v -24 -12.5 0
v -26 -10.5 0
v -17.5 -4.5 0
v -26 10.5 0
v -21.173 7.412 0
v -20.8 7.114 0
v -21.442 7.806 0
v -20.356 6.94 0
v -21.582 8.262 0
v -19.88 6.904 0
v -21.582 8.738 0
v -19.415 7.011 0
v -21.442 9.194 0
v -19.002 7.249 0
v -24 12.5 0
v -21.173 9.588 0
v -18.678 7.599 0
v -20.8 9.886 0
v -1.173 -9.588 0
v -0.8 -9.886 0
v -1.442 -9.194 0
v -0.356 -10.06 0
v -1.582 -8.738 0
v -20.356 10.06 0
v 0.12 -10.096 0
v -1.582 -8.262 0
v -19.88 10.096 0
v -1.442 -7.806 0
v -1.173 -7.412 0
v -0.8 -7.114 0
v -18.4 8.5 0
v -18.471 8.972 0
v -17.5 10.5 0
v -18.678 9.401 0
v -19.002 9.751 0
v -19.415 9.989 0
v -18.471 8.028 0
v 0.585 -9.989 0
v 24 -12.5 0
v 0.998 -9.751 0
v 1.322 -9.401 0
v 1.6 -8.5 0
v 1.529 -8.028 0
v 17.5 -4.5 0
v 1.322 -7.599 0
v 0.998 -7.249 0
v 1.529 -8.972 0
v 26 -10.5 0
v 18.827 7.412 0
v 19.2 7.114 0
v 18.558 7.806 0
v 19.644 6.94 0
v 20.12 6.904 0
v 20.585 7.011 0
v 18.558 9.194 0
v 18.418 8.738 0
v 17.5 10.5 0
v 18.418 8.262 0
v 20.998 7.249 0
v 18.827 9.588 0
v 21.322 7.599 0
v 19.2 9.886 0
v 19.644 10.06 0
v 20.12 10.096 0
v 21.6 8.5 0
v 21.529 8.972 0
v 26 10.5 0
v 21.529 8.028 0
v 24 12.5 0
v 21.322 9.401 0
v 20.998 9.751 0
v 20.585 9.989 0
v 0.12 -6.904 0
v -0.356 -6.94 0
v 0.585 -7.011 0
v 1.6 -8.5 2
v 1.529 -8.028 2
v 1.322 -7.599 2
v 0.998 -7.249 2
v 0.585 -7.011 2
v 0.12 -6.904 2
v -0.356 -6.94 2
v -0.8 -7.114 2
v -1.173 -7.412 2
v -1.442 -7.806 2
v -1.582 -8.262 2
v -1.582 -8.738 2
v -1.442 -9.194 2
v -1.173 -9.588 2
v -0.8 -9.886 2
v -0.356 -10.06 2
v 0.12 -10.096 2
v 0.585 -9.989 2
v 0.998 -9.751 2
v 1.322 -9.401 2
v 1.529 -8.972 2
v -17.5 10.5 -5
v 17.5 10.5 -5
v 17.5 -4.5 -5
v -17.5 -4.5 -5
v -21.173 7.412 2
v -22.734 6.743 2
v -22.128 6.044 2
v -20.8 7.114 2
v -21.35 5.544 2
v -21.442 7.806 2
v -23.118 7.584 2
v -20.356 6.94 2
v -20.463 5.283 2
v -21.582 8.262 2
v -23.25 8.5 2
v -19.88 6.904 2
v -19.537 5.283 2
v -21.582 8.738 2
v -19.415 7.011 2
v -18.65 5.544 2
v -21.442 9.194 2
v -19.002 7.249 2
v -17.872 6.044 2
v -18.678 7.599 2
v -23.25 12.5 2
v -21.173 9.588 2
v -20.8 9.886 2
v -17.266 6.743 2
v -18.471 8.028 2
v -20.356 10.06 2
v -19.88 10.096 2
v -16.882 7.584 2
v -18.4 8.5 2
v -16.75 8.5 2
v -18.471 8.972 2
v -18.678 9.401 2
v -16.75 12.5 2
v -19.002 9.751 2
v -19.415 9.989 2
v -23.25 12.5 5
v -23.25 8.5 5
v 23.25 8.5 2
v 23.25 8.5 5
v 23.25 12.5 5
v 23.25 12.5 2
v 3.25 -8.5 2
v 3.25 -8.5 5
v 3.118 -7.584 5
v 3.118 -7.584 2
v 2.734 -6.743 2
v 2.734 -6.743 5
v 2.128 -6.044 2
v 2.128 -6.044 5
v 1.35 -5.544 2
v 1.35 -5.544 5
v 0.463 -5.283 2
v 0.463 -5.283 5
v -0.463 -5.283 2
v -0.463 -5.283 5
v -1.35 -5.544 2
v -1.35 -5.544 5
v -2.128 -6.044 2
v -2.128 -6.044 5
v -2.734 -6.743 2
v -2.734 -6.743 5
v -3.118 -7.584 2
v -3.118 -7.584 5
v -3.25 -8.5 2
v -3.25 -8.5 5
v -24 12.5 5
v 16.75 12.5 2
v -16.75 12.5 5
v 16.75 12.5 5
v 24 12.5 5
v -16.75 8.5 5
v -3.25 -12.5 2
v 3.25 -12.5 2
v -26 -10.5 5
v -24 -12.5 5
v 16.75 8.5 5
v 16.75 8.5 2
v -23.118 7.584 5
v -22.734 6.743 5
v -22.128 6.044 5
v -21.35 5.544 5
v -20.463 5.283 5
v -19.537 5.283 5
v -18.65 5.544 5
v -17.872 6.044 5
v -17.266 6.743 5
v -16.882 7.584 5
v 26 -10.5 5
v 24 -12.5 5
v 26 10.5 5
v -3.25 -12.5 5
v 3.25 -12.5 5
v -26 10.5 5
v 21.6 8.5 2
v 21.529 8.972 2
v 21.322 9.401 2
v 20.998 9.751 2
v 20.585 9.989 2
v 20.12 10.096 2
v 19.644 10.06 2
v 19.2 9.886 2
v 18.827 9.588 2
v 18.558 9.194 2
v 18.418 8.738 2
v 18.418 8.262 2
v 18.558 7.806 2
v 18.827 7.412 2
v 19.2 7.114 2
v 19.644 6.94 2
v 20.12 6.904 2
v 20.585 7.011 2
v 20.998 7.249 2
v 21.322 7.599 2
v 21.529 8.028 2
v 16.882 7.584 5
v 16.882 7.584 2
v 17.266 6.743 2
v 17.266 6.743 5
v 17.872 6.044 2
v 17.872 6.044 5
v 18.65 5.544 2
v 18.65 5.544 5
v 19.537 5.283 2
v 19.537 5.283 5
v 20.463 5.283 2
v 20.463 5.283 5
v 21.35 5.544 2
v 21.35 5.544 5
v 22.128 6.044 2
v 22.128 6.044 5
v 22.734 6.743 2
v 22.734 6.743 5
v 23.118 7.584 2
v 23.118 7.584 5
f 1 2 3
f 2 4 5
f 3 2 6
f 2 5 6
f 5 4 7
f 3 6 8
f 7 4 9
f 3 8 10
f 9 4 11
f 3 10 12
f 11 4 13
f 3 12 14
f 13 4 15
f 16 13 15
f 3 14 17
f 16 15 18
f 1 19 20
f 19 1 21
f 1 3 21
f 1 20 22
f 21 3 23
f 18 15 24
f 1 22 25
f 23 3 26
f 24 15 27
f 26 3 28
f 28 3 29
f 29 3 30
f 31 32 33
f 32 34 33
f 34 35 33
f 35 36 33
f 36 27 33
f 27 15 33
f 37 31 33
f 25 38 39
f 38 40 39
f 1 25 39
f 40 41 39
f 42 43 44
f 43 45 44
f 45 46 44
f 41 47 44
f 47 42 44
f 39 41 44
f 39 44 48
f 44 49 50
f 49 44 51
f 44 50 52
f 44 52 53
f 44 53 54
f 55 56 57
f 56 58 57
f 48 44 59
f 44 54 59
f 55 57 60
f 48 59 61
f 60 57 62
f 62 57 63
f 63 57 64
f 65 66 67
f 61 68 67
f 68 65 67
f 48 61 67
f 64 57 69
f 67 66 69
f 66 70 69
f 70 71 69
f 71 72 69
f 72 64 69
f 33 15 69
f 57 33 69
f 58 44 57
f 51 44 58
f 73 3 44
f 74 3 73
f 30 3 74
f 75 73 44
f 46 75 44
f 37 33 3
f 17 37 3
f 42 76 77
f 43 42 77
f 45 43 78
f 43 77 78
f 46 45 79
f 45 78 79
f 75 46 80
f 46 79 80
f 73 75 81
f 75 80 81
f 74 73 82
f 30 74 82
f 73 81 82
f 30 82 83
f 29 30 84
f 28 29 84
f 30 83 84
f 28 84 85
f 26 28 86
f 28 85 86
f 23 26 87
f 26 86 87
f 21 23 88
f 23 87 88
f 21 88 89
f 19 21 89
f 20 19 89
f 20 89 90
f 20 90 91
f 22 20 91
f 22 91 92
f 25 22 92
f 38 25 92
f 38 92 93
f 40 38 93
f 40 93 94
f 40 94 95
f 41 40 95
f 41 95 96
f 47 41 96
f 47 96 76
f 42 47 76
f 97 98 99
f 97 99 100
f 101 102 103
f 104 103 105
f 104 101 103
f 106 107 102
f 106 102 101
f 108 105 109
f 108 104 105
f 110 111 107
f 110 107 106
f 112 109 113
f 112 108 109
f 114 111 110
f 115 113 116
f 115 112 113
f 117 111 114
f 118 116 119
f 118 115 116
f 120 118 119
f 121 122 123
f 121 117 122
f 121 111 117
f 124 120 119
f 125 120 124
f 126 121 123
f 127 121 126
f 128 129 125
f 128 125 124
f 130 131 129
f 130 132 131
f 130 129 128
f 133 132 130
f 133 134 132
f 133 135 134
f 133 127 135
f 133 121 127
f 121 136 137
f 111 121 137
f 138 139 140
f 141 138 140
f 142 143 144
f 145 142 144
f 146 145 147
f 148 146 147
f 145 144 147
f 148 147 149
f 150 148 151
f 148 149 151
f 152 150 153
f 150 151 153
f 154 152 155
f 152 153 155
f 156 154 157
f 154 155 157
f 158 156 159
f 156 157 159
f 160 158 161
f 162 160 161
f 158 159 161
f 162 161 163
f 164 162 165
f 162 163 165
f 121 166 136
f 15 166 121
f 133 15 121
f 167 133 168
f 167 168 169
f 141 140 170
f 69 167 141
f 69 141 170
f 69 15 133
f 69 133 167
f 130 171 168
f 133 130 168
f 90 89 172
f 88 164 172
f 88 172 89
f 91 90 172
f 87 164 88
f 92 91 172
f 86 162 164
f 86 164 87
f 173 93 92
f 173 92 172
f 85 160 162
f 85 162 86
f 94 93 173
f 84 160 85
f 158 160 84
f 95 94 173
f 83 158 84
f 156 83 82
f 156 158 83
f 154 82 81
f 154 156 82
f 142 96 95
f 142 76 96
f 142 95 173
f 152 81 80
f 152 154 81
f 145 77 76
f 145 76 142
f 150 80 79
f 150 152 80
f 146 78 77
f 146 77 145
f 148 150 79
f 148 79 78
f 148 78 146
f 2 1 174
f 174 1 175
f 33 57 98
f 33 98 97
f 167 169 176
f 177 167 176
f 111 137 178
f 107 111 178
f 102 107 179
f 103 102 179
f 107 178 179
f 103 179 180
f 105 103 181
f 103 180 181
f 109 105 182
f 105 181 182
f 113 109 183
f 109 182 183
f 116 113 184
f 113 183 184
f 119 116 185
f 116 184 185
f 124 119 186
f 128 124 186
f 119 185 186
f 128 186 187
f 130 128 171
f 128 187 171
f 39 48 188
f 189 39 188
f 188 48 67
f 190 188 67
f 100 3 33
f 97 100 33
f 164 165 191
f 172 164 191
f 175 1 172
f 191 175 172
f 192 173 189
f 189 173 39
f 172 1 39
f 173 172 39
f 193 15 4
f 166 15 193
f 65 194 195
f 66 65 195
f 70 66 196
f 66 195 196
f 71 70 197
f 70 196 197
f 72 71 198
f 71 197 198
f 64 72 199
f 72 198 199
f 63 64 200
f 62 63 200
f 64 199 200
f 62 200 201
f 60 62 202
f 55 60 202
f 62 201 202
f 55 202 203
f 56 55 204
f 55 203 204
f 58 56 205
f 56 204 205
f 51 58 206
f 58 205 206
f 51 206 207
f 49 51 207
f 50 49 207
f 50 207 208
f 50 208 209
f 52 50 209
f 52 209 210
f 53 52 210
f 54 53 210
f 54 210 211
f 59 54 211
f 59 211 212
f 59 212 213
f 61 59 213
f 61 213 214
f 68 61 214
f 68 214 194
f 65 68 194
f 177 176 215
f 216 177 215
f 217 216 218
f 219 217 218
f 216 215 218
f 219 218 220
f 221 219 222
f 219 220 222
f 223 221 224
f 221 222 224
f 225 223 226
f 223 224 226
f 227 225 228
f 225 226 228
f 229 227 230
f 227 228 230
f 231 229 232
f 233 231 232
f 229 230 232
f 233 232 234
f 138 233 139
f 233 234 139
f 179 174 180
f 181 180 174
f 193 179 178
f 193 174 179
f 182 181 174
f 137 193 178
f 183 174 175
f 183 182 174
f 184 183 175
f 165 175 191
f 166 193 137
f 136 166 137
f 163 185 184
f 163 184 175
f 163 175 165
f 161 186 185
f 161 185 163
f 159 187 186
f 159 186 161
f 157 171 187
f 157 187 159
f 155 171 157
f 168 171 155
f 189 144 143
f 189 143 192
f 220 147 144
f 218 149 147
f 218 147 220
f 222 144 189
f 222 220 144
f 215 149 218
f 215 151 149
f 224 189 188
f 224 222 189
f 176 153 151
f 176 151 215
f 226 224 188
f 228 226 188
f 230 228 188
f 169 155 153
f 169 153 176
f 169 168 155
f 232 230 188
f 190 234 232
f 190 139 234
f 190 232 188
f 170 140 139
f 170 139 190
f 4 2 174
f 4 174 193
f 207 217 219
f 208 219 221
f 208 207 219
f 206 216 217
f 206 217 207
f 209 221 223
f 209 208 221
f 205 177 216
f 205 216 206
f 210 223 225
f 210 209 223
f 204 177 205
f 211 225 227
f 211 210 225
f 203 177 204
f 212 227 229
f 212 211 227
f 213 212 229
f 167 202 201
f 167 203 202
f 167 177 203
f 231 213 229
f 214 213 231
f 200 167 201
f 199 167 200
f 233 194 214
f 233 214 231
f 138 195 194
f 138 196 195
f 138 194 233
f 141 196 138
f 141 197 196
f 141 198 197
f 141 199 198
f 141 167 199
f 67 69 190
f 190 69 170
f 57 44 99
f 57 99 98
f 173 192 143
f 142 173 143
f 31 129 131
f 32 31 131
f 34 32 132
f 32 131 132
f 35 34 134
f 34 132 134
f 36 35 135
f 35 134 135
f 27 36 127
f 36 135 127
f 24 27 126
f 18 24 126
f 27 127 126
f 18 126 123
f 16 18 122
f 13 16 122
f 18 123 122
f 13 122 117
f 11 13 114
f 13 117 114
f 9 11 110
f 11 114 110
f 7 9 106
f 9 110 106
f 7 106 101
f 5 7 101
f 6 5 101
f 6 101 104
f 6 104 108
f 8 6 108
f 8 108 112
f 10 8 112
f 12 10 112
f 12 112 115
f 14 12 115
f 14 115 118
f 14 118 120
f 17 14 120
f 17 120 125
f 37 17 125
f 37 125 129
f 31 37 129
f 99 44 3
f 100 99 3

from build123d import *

# Parameters (mm, degrees)
SKETCH_1_W          = 52
SKETCH_1_H          = 25
EXTRUDE_1_DEPTH     = 5
CHAMFER_1_SIZE      = 2
SKETCH_2_W          = 35
SKETCH_2_H          = 15
EXTRUDE_2_DEPTH     = 5
CUT_EXTRUDE_1_DEPTH = 3
SKETCH_5_R          = 1.6
CUT_EXTRUDE_2_DEPTH = 8


with BuildPart() as part:
    # Эскиз1 → Бобышка-Вытянуть1 (new body)
    with BuildSketch(Plane.XY):
        Rectangle(SKETCH_1_W, SKETCH_1_H)
    extrude(amount=EXTRUDE_1_DEPTH)

    # Фаска1
    chamfer_1_edges = [part.edges().sort_by_distance(p)[0] for p in [
        (26, -12.5, 2.5),
        (-26, -12.5, 2.5),
        (-26, 12.5, 2.5),
        (26, 12.5, 2.5),
    ]]
    chamfer(chamfer_1_edges, length=CHAMFER_1_SIZE)

    # Эскиз2 → Бобышка-Вытянуть2 (add)
    with BuildSketch(Plane(origin=(0, 0, 0), x_dir=(-1, 0, 0), z_dir=(0, 0, -1))):
        with Locations((0, 3)):
            Rectangle(SKETCH_2_W, SKETCH_2_H)
    extrude(amount=EXTRUDE_2_DEPTH)

    # Эскиз3 → Вырез-Вытянуть1 (cut)
    with BuildSketch(Plane.XY.offset(5)):
        with BuildLine():
            Line((3.25, -12.5), (3.25, -8.5))
            ThreePointArc((3.25, -8.5), (0, -5.25), (-3.25, -8.5))
            Line((-3.25, -8.5), (-3.25, -12.5))
            Line((-3.25, -12.5), (3.25, -12.5))
        make_face()
        with BuildLine():
            Line((-23.25, 12.5), (-23.25, 8.5))
            ThreePointArc((-23.25, 8.5), (-20, 5.25), (-16.75, 8.5))
            Line((-16.75, 8.5), (-16.75, 12.5))
            Line((-16.75, 12.5), (-23.25, 12.5))
        make_face()
        with BuildLine():
            Line((16.75, 12.5), (16.75, 8.5))
            ThreePointArc((16.75, 8.5), (20, 5.25), (23.25, 8.5))
            Line((23.25, 8.5), (23.25, 12.5))
            Line((23.25, 12.5), (16.75, 12.5))
        make_face()
    extrude(amount=-CUT_EXTRUDE_1_DEPTH, mode=Mode.SUBTRACT)

    # Эскиз5 → Вырез-Вытянуть2 (cut, through all)
    with BuildSketch(Plane.XY.offset(2)):
        with Locations((0, -8.5)):
            Circle(SKETCH_5_R)
        with Locations((-20, 8.5)):
            Circle(SKETCH_5_R)
        with Locations((20, 8.5)):
            Circle(SKETCH_5_R)
    extrude(amount=-CUT_EXTRUDE_2_DEPTH, mode=Mode.SUBTRACT)


solid = part.part
